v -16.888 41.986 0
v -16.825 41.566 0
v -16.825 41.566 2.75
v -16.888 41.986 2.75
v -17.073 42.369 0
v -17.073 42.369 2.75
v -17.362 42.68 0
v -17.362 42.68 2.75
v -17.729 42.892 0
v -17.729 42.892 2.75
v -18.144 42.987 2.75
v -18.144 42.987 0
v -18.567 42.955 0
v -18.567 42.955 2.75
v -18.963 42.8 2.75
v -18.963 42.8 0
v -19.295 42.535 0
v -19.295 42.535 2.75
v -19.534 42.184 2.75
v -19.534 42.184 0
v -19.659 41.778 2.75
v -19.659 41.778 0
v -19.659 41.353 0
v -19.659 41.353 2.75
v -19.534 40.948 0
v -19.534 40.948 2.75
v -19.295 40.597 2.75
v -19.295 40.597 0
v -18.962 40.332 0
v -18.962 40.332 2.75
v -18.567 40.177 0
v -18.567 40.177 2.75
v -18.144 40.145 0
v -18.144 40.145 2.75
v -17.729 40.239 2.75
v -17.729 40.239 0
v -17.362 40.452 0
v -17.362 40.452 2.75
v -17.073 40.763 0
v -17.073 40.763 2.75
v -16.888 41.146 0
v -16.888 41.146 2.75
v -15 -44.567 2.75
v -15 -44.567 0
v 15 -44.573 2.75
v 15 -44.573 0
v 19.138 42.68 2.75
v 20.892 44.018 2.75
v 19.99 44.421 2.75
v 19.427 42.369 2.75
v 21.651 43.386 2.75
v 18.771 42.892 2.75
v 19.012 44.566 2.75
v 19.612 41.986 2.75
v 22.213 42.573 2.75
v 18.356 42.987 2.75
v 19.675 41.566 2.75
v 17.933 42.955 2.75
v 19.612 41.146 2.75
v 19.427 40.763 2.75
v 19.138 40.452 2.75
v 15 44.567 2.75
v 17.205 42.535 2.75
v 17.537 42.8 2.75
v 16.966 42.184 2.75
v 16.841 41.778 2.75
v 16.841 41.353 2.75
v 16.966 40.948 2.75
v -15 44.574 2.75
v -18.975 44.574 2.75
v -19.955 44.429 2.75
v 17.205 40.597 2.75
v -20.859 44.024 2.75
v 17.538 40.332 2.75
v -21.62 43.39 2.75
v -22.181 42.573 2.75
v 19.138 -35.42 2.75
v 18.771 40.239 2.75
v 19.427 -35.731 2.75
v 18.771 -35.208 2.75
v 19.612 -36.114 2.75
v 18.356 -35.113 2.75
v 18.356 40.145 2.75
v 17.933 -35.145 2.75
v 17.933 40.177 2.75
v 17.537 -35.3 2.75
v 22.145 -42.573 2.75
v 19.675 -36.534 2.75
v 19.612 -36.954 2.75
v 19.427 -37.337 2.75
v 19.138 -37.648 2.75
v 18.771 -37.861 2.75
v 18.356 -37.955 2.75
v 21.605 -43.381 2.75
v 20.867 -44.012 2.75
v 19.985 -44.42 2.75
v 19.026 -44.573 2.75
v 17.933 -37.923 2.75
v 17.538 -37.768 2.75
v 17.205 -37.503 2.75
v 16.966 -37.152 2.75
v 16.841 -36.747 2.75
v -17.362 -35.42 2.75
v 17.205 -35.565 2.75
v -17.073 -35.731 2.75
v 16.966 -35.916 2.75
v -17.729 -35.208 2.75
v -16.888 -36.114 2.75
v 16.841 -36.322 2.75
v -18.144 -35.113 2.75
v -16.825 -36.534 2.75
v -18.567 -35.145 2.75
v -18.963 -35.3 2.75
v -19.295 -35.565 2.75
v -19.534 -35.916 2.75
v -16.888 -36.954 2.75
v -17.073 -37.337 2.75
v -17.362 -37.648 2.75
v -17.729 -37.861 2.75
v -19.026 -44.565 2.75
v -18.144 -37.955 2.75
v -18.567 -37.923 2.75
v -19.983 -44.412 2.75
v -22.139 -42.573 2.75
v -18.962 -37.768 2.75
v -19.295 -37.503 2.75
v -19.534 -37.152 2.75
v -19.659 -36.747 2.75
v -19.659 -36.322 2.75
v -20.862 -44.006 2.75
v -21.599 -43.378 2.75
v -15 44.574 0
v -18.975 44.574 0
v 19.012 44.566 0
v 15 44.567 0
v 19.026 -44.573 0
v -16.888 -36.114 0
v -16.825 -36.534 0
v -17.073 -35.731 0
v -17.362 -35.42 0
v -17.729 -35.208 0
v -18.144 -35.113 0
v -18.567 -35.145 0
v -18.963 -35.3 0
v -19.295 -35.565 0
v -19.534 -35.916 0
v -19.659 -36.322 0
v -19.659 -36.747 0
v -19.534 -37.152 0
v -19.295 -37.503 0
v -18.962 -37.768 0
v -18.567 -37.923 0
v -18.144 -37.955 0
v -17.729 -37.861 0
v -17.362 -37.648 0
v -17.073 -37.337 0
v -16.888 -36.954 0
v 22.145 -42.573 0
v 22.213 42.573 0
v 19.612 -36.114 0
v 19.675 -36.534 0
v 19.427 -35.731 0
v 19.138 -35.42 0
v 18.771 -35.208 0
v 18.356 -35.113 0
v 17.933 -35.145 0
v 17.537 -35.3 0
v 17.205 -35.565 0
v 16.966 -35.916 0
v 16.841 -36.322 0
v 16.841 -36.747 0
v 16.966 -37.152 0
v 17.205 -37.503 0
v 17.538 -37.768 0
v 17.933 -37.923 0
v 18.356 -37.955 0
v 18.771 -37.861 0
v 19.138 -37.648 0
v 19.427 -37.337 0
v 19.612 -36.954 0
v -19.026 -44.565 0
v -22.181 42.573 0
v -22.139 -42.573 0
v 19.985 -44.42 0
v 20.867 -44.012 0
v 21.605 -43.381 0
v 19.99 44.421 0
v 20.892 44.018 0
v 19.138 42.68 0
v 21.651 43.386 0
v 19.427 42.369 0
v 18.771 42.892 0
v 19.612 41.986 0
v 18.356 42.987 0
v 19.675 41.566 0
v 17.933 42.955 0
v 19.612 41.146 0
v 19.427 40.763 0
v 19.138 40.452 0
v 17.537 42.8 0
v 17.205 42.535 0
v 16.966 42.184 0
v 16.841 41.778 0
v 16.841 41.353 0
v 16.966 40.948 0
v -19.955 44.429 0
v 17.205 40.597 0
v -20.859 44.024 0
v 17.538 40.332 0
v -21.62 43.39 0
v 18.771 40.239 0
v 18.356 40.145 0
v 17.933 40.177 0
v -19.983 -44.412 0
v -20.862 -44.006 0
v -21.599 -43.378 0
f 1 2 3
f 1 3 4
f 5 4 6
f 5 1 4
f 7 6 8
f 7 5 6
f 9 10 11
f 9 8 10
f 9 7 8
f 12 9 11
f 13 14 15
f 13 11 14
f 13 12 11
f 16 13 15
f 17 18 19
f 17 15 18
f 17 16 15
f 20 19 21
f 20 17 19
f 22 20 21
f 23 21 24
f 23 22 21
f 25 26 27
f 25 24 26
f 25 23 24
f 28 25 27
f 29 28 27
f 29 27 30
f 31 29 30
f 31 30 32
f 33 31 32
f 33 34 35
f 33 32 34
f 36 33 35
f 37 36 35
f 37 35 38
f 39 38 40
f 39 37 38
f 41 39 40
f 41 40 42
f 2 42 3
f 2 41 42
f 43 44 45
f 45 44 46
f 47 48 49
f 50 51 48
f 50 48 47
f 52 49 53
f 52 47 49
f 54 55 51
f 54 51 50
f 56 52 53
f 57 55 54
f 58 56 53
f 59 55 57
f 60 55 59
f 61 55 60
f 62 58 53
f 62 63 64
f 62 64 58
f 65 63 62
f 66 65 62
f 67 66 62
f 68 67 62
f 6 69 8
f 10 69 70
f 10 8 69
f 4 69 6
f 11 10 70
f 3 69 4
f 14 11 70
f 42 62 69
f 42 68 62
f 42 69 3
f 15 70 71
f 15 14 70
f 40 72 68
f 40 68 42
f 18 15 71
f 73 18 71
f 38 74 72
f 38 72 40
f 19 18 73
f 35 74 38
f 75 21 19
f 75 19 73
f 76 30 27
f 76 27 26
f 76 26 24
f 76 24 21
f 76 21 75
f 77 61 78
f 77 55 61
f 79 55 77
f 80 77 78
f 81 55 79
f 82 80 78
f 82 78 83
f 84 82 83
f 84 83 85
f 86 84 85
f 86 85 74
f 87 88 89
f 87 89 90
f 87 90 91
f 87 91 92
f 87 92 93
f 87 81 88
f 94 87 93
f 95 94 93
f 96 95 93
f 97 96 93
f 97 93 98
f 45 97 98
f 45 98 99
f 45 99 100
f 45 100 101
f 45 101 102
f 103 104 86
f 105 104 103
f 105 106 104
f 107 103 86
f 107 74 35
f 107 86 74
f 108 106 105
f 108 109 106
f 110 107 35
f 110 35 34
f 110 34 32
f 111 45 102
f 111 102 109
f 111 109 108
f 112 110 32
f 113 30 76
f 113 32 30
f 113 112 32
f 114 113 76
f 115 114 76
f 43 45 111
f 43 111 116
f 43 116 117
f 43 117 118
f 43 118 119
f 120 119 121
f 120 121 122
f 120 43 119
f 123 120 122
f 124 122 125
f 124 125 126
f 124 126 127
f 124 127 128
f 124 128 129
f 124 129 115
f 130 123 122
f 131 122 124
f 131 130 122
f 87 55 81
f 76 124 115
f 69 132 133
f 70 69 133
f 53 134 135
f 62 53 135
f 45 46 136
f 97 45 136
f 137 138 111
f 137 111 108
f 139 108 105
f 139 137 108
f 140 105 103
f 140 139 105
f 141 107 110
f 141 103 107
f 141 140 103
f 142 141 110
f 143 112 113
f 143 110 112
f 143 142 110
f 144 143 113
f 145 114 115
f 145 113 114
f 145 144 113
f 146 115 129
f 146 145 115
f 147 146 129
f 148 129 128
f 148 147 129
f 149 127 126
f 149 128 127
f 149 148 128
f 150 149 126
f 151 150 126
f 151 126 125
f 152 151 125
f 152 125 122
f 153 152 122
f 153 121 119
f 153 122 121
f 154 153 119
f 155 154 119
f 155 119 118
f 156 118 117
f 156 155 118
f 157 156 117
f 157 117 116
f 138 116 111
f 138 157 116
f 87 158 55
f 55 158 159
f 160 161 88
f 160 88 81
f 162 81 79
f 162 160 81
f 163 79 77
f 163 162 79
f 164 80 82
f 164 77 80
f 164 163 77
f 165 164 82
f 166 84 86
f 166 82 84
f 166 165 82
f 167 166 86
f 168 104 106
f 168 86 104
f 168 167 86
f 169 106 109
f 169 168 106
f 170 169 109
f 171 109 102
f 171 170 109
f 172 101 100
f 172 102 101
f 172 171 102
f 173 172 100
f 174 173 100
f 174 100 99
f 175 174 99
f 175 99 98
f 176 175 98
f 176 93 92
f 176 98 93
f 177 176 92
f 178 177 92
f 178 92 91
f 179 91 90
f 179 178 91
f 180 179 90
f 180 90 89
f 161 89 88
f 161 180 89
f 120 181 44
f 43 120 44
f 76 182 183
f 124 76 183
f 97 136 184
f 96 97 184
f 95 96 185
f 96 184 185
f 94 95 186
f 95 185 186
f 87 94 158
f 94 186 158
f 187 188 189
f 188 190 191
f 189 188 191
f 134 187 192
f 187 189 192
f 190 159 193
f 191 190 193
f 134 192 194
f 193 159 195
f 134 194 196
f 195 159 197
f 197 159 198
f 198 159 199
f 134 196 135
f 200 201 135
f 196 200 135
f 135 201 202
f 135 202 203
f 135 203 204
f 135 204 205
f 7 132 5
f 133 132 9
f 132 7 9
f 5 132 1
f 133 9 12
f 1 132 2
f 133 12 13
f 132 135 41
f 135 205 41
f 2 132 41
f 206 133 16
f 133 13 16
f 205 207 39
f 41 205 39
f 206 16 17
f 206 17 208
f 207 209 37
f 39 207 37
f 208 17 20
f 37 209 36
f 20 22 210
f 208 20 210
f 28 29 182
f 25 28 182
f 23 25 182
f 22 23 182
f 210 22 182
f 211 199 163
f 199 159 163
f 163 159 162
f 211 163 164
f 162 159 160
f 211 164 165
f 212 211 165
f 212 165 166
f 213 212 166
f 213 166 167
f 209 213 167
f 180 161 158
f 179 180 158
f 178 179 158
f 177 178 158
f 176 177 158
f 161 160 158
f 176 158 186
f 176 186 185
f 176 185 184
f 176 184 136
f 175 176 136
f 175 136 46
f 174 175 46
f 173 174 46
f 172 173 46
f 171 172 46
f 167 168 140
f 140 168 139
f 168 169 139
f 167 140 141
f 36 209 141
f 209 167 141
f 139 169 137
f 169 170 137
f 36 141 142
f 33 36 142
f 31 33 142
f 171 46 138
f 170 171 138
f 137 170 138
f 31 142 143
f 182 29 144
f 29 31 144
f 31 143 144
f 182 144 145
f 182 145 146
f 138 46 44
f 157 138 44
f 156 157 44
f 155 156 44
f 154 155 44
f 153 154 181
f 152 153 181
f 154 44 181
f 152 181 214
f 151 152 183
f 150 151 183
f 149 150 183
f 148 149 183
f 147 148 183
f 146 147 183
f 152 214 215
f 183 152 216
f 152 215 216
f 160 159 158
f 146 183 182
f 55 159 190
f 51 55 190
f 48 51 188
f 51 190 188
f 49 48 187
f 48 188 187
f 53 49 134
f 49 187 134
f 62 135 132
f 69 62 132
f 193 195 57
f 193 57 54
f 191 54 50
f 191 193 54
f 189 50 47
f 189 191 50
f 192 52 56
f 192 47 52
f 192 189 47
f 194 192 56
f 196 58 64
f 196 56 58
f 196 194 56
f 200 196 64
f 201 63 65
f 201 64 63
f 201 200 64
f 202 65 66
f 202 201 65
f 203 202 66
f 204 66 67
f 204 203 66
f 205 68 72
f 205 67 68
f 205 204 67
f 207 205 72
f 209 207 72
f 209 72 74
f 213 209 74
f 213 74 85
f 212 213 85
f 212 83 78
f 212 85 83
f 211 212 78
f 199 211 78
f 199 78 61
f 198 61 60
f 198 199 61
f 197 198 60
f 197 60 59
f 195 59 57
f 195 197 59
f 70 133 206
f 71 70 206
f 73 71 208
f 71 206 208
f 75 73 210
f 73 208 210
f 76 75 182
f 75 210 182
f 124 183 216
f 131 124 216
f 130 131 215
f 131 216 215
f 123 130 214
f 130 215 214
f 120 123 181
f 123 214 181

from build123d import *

# Parameters (mm, degrees)
BOSS_EXTRUDE1_DEPTH     = 2.75
CUT_EXTRUDE1_DEPTH      = 50.877740599
CUT_EXTRUDE1_DEPTH_BACK = 50.877740599
SKETCH2_R               = 1.425


with BuildPart() as part:
    # Sketch1 → Boss-Extrude1 (new body)
    with BuildSketch(Plane(origin=(0, 0, 0), x_dir=(-1, 0, 0), z_dir=(0, 0, 1))):
        with BuildLine():
            Line((19.026354954, 44.565132863), (15.00001057, 44.566877537))
            Line((15.00001057, 44.566877537), (-15.000000006, 44.573221717))
            Line((-15.000000006, 44.573221717), (-19.026379978, 44.573180573))
            ThreePointArc((-19.026379978, 44.573180573), (-20.866998297, 44.012105117), (-22.144784315, 42.573375))
            Line((-22.144784315, 42.573375), (-22.212600147, -42.573375))
            ThreePointArc((-22.212600147, -42.573375), (-20.89165665, -44.017987624), (-19.012374049, -44.565796226))
            Line((-19.012374049, -44.565796226), (-15.000008938, -44.567395648))
            Line((-15.000008938, -44.567395648), (15, -44.573739828))
            Line((15, -44.573739828), (18.975450836, -44.573836518))
            ThreePointArc((18.975450836, -44.573836518), (20.859429803, -44.024042544), (22.18125197, -42.573375))
            Line((22.18125197, -42.573375), (22.139374041, 42.573375))
            ThreePointArc((22.139374041, 42.573375), (20.862361619, 44.006094116), (19.026354954, 44.565132863))
        make_face()
    extrude(amount=BOSS_EXTRUDE1_DEPTH)

    # Sketch2 → Cut-Extrude1 (cut, two sides: drawn at the far end of the back side and taken through both)
    with BuildSketch(Plane.XY.offset(2.75).offset(-CUT_EXTRUDE1_DEPTH_BACK)):
        with Locations((-18.25, 41.565796226)):
            Circle(SKETCH2_R)
        with Locations((18.25, 41.565796226)):
            Circle(SKETCH2_R)
        with Locations((18.25, -36.534203774)):
            Circle(SKETCH2_R)
        with Locations((-18.25, -36.534203774)):
            Circle(SKETCH2_R)
    extrude(amount=CUT_EXTRUDE1_DEPTH + CUT_EXTRUDE1_DEPTH_BACK, mode=Mode.SUBTRACT)


solid = part.part
